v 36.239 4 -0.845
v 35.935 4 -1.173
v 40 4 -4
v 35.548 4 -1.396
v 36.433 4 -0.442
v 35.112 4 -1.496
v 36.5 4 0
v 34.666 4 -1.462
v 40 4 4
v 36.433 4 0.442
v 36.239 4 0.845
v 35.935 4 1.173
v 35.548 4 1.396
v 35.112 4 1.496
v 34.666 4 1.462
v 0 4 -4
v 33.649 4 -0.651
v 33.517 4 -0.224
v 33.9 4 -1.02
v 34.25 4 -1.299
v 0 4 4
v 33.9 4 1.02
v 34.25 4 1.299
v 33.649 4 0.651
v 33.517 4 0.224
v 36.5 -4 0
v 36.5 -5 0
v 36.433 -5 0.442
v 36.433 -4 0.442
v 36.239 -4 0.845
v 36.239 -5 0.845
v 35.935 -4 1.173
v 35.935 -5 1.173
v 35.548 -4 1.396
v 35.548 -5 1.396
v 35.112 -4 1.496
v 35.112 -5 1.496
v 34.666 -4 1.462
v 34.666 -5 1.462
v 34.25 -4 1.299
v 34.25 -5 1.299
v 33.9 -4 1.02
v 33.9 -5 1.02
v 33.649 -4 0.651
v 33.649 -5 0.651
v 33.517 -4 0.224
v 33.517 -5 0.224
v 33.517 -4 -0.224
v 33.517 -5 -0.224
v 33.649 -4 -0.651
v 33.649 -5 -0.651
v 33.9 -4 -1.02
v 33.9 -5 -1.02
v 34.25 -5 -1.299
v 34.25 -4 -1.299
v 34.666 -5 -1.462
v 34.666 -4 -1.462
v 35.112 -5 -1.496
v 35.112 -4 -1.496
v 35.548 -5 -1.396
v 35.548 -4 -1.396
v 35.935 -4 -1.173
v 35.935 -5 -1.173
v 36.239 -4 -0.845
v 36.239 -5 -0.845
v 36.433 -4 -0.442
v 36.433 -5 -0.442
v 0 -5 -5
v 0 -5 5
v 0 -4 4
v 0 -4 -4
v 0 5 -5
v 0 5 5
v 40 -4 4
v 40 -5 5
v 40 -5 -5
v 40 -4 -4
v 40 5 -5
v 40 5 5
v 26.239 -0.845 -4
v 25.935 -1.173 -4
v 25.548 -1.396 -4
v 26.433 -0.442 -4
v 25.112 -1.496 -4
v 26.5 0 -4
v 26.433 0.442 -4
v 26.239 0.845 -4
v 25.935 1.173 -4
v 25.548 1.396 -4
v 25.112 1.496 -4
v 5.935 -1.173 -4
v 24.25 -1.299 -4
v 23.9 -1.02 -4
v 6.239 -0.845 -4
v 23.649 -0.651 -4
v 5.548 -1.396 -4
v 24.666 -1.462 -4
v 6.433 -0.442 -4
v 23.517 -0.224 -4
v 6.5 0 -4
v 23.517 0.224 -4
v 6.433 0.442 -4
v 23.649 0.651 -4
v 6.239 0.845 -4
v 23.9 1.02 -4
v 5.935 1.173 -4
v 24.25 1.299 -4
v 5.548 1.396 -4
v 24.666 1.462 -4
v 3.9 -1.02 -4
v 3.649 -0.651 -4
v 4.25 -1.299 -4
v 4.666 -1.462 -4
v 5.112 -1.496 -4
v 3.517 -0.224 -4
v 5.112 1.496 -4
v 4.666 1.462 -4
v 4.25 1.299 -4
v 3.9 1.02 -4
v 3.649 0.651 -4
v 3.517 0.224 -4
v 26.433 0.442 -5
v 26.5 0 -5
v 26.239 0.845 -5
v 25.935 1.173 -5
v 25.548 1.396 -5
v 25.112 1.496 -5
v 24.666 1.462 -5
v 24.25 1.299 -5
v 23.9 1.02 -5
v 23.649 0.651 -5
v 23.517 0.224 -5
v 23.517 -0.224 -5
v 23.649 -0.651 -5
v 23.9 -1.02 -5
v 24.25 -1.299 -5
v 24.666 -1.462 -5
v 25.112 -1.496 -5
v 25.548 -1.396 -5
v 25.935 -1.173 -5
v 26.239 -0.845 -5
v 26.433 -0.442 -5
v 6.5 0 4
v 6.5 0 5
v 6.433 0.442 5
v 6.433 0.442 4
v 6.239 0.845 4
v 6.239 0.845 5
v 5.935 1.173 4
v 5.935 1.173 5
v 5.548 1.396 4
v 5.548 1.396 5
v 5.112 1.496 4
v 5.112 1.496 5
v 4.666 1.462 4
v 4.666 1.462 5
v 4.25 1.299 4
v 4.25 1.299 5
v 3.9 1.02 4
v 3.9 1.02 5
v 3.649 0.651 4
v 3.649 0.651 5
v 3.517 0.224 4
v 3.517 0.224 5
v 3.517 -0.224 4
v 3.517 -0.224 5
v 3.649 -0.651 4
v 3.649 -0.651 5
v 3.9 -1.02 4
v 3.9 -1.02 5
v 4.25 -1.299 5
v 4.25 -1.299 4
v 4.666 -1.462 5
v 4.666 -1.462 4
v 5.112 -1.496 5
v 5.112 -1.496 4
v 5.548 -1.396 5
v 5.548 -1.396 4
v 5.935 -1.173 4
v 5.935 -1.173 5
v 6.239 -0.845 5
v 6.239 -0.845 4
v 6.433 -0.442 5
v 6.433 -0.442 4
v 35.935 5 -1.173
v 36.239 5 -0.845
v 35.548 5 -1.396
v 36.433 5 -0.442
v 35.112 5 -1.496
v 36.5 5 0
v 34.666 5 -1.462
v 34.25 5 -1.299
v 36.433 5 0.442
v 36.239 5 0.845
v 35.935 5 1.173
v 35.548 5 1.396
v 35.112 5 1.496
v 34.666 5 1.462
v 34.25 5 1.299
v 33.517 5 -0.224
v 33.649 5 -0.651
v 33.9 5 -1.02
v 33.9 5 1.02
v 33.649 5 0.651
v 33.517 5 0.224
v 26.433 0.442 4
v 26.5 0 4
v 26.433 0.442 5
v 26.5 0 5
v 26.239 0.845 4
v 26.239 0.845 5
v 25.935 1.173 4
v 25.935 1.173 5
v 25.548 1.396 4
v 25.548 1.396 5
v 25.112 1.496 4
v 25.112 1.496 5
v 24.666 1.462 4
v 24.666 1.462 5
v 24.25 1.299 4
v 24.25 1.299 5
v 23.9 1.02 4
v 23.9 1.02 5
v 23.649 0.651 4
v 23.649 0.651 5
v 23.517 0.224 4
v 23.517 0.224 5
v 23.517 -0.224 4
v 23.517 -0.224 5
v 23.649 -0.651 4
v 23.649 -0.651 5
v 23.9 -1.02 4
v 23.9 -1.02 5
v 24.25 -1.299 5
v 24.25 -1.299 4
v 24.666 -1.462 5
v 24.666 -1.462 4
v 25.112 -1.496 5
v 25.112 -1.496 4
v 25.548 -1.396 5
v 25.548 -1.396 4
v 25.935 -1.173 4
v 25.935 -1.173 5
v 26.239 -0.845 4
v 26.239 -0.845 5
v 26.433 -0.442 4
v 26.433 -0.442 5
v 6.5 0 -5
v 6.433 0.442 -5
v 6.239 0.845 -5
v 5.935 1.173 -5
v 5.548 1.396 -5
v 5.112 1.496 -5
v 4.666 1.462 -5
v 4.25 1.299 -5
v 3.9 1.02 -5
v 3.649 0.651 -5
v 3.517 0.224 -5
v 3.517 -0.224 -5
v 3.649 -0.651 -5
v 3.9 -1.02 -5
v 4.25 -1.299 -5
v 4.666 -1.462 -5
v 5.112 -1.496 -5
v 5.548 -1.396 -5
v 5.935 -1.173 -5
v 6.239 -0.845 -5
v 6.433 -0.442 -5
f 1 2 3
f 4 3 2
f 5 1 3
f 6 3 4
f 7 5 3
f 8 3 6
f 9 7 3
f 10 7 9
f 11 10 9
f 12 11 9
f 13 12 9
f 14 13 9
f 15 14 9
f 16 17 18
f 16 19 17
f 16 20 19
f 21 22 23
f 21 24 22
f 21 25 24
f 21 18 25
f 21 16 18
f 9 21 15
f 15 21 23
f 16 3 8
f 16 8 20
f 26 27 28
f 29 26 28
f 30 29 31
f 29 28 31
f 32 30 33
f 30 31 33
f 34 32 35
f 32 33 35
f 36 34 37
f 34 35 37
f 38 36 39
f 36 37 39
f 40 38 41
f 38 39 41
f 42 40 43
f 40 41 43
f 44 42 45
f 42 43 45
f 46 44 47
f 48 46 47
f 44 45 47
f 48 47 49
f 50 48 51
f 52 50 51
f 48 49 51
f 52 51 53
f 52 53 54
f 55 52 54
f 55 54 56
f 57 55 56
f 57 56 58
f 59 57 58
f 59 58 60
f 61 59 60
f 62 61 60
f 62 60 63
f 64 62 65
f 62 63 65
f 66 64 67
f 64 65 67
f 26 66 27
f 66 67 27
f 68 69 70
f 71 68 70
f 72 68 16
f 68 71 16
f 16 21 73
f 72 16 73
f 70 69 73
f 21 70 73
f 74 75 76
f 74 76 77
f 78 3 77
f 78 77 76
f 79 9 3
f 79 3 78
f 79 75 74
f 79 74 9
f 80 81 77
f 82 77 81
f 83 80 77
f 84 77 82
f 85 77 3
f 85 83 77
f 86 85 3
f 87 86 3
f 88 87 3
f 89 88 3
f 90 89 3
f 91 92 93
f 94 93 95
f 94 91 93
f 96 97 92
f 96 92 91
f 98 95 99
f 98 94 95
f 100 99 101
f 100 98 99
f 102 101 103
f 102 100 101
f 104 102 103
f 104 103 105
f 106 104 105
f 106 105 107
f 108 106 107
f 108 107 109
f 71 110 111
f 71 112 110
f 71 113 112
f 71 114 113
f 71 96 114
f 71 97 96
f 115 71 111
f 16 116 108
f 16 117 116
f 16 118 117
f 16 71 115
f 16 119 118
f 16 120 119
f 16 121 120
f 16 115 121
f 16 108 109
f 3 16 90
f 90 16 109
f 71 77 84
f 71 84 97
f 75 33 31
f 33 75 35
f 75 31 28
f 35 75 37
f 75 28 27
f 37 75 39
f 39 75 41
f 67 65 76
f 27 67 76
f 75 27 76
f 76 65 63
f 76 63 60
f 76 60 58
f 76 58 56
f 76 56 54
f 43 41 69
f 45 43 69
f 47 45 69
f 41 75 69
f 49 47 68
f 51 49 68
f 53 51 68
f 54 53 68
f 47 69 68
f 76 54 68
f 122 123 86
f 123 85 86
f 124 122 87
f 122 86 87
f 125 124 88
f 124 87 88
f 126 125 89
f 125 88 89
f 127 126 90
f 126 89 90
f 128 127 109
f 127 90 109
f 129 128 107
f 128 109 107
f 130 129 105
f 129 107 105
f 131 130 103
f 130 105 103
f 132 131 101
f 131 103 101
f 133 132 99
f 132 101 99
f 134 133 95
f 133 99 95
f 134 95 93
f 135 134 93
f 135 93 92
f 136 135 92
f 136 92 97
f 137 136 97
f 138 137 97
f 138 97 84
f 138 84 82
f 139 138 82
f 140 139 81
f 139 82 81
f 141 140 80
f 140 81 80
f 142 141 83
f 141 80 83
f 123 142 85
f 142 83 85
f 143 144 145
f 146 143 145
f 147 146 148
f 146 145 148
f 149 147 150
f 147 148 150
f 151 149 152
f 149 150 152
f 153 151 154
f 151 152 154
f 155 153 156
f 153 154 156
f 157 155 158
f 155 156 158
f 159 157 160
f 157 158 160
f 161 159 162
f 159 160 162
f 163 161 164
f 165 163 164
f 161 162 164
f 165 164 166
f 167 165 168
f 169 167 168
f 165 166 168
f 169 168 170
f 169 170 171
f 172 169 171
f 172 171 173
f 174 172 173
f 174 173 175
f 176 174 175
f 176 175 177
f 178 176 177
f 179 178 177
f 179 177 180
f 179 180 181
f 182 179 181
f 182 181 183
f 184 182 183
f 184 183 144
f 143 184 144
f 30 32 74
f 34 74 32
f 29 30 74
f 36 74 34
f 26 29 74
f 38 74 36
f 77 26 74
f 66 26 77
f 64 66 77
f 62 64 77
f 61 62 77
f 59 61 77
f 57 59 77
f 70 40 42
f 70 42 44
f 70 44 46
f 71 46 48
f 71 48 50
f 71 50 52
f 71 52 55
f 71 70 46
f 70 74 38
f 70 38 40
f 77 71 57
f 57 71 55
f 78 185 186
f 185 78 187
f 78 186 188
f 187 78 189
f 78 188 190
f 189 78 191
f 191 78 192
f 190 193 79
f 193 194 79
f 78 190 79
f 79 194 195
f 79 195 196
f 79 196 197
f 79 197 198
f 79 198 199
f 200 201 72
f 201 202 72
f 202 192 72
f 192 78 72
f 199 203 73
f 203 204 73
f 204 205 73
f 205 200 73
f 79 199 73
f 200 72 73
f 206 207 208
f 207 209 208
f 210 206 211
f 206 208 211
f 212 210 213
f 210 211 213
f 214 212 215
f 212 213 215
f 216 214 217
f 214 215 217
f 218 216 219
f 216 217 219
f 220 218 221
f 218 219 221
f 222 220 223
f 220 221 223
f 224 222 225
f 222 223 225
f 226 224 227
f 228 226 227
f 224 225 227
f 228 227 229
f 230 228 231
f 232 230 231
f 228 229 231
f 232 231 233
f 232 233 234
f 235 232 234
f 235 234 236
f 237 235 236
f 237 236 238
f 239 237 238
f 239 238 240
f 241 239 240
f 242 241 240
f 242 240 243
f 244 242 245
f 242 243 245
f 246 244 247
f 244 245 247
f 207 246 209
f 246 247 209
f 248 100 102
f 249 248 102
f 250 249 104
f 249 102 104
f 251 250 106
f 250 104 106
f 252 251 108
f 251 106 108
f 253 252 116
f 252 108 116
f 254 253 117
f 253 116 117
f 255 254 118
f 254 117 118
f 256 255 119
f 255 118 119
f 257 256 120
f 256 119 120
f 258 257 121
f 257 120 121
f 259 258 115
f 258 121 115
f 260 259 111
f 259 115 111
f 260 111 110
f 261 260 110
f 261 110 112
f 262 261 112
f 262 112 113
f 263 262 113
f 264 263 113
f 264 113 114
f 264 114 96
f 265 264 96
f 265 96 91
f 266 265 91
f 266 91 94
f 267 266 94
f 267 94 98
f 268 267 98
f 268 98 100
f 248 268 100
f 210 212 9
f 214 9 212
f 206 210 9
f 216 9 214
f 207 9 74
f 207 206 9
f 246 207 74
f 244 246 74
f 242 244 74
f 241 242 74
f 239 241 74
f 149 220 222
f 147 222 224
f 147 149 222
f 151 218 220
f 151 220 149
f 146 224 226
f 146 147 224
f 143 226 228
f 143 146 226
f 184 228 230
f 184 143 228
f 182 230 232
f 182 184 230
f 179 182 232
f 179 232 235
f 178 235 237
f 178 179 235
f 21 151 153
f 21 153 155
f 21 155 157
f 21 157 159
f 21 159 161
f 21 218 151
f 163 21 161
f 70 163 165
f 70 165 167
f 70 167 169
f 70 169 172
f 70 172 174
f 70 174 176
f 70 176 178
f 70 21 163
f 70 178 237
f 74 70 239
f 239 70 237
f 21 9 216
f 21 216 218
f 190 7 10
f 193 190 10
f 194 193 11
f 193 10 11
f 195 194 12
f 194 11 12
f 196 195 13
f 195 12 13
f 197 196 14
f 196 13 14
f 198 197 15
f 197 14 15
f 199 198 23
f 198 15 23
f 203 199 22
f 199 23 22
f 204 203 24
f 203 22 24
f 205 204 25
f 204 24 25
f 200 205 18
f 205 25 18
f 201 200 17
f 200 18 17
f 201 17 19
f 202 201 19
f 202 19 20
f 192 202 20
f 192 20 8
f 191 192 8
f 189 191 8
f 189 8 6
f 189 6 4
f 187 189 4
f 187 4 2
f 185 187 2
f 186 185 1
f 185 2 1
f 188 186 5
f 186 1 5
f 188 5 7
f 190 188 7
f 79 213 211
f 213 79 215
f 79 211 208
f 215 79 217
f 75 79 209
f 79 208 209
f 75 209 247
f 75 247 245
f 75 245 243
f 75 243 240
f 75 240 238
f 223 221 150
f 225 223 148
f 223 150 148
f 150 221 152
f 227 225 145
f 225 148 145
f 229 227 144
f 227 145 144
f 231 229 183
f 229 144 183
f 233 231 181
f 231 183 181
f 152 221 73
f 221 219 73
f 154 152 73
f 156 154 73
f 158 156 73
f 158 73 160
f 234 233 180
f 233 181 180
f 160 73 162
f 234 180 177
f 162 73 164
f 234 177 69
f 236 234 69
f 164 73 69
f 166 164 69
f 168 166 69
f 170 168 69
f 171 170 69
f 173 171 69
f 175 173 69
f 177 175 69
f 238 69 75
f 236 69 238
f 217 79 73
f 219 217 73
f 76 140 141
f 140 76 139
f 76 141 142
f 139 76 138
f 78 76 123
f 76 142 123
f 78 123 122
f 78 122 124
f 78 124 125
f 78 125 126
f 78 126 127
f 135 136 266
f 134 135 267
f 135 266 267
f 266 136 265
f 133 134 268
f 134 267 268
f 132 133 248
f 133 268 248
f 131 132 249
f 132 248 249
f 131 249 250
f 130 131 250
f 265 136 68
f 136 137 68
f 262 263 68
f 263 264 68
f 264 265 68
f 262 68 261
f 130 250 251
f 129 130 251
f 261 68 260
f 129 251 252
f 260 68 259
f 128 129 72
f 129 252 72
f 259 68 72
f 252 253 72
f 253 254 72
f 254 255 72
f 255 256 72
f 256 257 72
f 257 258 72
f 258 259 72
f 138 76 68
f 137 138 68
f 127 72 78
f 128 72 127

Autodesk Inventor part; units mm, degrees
ref_plane "YZ Plane" through (0, 0, 0) normal (1, 0, 0) x (0, 1, 0)
ref_plane "XZ Plane" through (0, 0, 0) normal (0, 1, 0) x (-1, 0, 0)
ref_plane "XY Plane" through (0, 0, 0) normal (0, 0, 1) x (1, 0, 0)
sketch "スケッチ1" plane through (0, 0, 0) normal (1, 0, 0) x (0, 1, 0)
  line L0 (5, 5) -> (-5, 5)
  line L1 (-5, 5) -> (-5, -5)
  line L2 (-5, -5) -> (5, -5)
  line L3 (5, -5) -> (5, 5)
  line L4 (4, 4) -> (-4, 4)
  line L5 (-4, 4) -> (-4, -4)
  line L6 (-4, -4) -> (4, -4)
  line L7 (4, -4) -> (4, 4)
  point P0 (0, 0)
  dimension "d0" = 1
  dimension "d1" = 1
  dimension "d2" = 1
  dimension "d3" = 1
  dimension "d4" = 10
  dimension "d5" = 10
  dimension "d6" = 5
  dimension "d7" = 5
extrude "押し出し1" add sketch "スケッチ1" along normal blind 40
sketch "スケッチ2" plane through (0, -5, 5) normal (0, 0, 1) x (1, 0, 0)
  circle A0 centre (5, 5) radius 1.5
  circle A1 centre (25, 5) radius 1.5
  line L0 (0, 10) -> (0, 0) projected
  line L1 (0, 0) -> (40, 0) projected
  line L2 (40, 10) -> (40, 0) projected
  point P0 (0, 5)
  dimension "d10" = 5
  dimension "d11" = 5
  dimension "d12" = 5
  dimension "d13" = 15
  dimension "d14" = 3
  dimension "d15" = 3
extrude "押し出し2" cut sketch "スケッチ2" against normal blind 30
sketch "スケッチ3" plane through (0, -5, -5) normal (0, -1, 0) x (1, 0, 0)
  circle A0 centre (35, 5) radius 1.5
  line L0 (40, 10) -> (40, 0) projected
  line L1 (0, 0) -> (40, 0) projected
  point P0 (0, 5)
  dimension "d18" = 5
  dimension "d19" = 5
  dimension "d20" = 3
extrude "押し出し3" cut sketch "スケッチ3" against normal blind 30
properties part number "モーターパーツ２" material "アルミニウム 6061"
